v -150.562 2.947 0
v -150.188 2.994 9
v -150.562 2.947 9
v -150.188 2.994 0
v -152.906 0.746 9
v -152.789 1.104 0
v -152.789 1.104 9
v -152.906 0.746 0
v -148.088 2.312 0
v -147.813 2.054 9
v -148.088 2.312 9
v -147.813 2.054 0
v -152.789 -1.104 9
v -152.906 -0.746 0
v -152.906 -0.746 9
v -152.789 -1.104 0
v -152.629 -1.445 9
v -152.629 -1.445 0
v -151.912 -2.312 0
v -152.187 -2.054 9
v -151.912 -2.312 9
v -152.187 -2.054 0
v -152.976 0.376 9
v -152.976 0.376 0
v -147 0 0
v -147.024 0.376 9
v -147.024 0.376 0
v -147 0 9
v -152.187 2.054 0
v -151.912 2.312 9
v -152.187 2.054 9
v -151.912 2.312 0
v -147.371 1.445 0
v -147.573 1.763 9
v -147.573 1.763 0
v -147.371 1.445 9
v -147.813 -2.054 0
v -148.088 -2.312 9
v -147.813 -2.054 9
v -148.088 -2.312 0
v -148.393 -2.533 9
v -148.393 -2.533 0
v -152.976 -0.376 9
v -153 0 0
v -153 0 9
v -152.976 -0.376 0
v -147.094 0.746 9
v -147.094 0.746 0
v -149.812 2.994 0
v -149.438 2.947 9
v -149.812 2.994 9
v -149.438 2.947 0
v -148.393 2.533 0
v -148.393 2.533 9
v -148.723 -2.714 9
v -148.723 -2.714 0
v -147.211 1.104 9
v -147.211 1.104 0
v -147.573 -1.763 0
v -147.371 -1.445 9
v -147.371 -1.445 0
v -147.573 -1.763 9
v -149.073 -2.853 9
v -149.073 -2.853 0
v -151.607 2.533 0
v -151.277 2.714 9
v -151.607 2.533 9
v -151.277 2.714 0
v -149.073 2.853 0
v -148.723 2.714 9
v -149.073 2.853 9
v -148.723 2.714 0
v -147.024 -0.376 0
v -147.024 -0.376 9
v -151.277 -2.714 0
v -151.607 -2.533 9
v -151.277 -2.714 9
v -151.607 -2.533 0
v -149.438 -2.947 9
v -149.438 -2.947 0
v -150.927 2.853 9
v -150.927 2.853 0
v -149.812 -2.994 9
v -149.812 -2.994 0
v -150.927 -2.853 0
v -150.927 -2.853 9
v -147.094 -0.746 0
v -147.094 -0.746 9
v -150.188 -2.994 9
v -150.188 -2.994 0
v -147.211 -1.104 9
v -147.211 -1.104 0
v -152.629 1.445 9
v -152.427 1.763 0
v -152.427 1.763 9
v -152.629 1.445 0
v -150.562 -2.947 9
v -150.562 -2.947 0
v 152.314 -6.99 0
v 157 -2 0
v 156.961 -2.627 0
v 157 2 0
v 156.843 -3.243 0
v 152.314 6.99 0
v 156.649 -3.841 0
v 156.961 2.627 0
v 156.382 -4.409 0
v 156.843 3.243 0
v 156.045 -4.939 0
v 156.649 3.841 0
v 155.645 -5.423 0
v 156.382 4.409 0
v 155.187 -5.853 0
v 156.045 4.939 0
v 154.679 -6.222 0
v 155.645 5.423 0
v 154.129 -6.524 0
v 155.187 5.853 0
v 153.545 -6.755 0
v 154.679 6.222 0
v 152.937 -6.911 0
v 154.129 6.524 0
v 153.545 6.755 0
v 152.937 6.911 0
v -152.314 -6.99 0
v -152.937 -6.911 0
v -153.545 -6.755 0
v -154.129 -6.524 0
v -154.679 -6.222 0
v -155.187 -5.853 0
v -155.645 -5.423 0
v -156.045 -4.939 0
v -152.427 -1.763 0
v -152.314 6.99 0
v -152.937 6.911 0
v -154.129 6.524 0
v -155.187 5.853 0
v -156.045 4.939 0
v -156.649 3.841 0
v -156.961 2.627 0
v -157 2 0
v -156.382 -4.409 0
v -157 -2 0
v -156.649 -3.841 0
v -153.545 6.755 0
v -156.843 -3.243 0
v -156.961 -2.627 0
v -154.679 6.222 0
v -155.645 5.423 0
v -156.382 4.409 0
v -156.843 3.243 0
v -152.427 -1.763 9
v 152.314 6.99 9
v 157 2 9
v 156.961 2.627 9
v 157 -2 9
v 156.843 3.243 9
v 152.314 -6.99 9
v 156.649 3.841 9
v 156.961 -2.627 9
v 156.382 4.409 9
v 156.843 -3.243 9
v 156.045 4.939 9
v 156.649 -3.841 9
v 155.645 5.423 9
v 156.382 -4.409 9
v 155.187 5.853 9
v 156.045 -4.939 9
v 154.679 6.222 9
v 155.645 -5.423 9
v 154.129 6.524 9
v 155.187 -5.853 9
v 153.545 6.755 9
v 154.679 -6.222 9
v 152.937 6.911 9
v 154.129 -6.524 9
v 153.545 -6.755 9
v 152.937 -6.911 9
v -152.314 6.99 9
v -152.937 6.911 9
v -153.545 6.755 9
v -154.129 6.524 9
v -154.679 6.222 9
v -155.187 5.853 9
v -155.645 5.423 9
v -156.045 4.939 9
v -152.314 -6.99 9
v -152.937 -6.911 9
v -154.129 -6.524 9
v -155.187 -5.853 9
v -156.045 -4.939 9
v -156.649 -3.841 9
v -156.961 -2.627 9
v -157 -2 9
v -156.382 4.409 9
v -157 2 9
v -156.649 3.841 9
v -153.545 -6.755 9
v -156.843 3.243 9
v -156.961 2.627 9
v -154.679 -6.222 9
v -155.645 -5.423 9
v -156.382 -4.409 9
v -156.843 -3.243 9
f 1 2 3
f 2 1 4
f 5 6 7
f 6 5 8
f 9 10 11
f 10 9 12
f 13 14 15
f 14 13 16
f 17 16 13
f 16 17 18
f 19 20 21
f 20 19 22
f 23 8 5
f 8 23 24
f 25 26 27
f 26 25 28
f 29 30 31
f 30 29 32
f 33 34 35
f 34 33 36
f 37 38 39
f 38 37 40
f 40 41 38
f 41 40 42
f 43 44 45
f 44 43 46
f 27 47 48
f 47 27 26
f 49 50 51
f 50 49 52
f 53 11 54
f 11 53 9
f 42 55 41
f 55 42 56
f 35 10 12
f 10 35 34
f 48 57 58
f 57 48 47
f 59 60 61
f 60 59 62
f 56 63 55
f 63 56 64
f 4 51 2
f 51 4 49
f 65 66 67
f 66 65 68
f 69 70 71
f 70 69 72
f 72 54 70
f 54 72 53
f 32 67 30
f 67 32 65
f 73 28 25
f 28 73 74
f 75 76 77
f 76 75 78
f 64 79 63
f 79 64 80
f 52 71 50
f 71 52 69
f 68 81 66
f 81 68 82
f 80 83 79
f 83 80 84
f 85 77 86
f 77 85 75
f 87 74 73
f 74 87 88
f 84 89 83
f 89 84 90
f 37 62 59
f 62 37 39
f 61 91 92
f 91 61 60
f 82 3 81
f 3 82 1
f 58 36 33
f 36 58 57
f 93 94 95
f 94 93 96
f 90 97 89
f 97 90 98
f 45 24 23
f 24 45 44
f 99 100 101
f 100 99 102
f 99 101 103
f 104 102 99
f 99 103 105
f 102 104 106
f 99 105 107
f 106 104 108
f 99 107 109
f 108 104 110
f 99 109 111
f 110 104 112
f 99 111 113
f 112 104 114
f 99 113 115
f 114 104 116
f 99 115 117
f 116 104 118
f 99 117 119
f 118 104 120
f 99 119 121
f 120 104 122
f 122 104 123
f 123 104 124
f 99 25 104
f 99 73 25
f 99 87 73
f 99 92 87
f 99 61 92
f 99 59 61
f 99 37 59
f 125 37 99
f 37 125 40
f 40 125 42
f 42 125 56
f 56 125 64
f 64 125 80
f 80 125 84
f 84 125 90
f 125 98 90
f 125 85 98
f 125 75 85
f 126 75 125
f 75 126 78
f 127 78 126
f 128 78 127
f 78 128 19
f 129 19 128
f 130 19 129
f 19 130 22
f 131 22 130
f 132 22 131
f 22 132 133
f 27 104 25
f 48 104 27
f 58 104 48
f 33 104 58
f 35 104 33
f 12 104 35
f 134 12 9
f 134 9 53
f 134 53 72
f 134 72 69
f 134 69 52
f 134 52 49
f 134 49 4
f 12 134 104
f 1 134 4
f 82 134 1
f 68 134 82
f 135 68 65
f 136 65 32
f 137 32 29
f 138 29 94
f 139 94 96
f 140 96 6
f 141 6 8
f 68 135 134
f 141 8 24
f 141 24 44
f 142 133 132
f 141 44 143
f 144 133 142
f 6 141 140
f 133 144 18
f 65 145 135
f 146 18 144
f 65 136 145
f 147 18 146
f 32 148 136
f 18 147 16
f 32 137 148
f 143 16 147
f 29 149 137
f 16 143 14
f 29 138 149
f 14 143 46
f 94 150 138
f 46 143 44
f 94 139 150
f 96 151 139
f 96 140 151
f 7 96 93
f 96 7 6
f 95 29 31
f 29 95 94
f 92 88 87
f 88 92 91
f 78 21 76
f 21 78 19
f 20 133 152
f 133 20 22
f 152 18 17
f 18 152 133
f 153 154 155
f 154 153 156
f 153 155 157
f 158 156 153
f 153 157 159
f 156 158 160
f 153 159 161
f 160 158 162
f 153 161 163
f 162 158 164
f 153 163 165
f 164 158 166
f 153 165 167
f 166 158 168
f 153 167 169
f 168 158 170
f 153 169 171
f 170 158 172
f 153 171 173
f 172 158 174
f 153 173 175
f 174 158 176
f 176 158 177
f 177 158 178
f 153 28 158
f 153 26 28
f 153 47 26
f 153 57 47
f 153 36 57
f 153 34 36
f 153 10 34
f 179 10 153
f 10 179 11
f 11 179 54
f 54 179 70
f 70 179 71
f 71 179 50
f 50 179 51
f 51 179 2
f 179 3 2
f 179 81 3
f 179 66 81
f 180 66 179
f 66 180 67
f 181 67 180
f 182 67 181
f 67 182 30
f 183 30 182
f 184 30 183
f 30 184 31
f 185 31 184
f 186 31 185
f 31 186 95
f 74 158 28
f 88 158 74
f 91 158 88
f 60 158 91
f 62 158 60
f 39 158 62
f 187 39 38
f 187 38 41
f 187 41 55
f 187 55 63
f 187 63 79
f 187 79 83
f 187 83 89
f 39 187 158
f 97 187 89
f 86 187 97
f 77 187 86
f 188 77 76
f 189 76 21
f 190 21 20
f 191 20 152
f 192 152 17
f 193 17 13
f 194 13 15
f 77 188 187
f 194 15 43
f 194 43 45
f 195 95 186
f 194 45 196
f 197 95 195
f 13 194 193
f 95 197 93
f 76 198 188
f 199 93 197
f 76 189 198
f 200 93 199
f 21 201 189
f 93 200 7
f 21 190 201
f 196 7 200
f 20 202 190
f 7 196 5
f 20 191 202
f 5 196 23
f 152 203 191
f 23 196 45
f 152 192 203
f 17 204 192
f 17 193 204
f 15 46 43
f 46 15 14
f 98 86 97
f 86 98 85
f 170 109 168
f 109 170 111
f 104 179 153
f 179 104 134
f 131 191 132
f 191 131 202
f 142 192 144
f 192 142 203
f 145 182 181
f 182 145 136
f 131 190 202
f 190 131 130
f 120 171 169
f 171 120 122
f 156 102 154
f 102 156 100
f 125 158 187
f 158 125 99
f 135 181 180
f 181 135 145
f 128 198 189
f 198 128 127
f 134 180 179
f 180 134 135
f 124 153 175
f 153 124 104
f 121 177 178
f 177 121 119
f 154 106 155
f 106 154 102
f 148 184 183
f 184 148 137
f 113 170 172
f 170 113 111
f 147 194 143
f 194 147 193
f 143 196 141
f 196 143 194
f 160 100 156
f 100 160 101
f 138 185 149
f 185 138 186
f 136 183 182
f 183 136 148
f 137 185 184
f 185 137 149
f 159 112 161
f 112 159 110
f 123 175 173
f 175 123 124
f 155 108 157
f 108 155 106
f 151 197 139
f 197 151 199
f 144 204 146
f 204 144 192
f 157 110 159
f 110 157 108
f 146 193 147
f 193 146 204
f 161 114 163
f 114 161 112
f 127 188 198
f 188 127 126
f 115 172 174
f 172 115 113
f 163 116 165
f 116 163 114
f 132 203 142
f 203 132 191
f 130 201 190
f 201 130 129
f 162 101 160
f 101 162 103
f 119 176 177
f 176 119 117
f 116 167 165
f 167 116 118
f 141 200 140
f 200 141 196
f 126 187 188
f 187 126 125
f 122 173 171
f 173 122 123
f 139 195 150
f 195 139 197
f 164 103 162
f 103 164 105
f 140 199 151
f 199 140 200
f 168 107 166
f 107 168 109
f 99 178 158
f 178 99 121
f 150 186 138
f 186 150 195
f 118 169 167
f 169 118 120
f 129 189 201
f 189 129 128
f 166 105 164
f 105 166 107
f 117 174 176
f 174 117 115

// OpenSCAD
$fn = 50;


difference() {
	union() {
		hull() {
			translate(v = [-152.0000000000, 2.0000000000, 0]) {
				cylinder(h = 9, r = 5);
			}
			translate(v = [152.0000000000, 2.0000000000, 0]) {
				cylinder(h = 9, r = 5);
			}
			translate(v = [-152.0000000000, -2.0000000000, 0]) {
				cylinder(h = 9, r = 5);
			}
			translate(v = [152.0000000000, -2.0000000000, 0]) {
				cylinder(h = 9, r = 5);
			}
		}
	}
	union() {
		translate(v = [-150.0000000000, 0.0000000000, 0]) {
			cylinder(h = 9, r = 3.0000000000);
		}
		translate(v = [-150.0000000000, 0.0000000000, 0]) {
			cylinder(h = 9, r = 1.5000000000);
		}
		translate(v = [-150.0000000000, 0.0000000000, 0]) {
			cylinder(h = 9, r = 1.5000000000);
		}
		translate(v = [-150.0000000000, 0.0000000000, 0]) {
			cylinder(h = 9, r = 1.5000000000);
		}
	}
}
